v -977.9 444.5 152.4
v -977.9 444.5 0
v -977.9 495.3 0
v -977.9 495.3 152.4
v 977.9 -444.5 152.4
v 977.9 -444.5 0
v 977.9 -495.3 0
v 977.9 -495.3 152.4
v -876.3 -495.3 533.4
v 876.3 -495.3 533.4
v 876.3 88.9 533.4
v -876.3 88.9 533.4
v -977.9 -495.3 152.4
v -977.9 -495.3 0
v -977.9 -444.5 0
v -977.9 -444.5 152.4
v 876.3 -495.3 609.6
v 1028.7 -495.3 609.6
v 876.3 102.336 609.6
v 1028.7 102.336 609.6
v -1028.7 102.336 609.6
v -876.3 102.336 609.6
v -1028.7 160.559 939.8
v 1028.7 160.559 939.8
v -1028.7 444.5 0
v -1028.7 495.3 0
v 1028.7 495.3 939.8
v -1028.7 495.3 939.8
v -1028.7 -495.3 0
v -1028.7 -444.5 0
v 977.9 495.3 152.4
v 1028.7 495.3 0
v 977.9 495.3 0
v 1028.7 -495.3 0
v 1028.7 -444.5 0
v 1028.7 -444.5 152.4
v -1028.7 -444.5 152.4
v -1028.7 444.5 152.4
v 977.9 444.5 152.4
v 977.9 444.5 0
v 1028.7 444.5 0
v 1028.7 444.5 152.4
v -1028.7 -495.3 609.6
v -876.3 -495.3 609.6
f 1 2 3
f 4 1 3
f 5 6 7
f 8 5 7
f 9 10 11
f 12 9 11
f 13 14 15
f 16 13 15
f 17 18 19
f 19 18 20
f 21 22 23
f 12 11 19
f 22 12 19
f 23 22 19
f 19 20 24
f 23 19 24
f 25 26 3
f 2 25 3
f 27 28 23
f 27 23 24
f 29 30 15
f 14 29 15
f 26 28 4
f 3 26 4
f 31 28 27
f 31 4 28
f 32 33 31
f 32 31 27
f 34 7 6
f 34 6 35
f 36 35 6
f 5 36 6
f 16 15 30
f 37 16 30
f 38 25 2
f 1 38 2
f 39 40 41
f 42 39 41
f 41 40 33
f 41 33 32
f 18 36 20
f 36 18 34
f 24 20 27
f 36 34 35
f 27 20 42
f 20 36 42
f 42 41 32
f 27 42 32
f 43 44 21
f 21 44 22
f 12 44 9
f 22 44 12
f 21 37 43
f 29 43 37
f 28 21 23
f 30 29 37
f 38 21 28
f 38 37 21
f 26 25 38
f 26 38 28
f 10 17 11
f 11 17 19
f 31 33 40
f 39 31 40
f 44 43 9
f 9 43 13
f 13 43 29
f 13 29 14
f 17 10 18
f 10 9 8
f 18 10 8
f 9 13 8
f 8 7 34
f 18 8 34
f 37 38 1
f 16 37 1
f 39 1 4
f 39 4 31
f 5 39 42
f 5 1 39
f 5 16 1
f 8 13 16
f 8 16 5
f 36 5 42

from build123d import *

# Parameters (mm, degrees)
F0_W     = 2057.4
F0_H     = 990.6
F1_DEPTH = 939.8
F3_DEPTH = 876.3
F5_DEPTH = 127000
F7_DEPTH = 152.4


with BuildPart() as f1:
    # F0 (on Top) → F1 (new body)
    with BuildSketch(Plane.XY):
        Rectangle(F0_W, F0_H)
    extrude(amount=F1_DEPTH)

    # F2 (on Right) → F3 (cut, symmetric)
    with BuildSketch(Plane.YZ):
        Polygon((-495.3, 939.8), (-495.3, 533.4), (88.9, 533.4), (160.5592849599, 939.8), align=None)
    extrude(amount=F3_DEPTH, both=True, mode=Mode.SUBTRACT)

    # F4 (on Right) → F5 (cut, symmetric)
    with BuildSketch(Plane.YZ):
        Polygon((-495.3, 939.8), (-495.3, 609.6), (102.33611593, 609.6), (160.5592849599, 939.8), align=None)
    extrude(amount=F5_DEPTH, both=True, mode=Mode.SUBTRACT)

    # F6 (on face) → F7 (cut)
    with BuildSketch(Plane(origin=(0, 0, 0), x_dir=(1, 0, 0), z_dir=(0, 0, -1))):
        Polygon((977.9, 495.3), (-977.9, 495.3), (-977.9, 444.5), (-1028.7, 444.5), (-1028.7, -444.5), (-977.9, -444.5), (-977.9, -495.3), (977.9, -495.3), (977.9, -444.5), (1028.7, -444.5), (1028.7, 444.5), (977.9, 444.5), align=None)
    extrude(amount=-F7_DEPTH, mode=Mode.SUBTRACT)


solid = f1.part
